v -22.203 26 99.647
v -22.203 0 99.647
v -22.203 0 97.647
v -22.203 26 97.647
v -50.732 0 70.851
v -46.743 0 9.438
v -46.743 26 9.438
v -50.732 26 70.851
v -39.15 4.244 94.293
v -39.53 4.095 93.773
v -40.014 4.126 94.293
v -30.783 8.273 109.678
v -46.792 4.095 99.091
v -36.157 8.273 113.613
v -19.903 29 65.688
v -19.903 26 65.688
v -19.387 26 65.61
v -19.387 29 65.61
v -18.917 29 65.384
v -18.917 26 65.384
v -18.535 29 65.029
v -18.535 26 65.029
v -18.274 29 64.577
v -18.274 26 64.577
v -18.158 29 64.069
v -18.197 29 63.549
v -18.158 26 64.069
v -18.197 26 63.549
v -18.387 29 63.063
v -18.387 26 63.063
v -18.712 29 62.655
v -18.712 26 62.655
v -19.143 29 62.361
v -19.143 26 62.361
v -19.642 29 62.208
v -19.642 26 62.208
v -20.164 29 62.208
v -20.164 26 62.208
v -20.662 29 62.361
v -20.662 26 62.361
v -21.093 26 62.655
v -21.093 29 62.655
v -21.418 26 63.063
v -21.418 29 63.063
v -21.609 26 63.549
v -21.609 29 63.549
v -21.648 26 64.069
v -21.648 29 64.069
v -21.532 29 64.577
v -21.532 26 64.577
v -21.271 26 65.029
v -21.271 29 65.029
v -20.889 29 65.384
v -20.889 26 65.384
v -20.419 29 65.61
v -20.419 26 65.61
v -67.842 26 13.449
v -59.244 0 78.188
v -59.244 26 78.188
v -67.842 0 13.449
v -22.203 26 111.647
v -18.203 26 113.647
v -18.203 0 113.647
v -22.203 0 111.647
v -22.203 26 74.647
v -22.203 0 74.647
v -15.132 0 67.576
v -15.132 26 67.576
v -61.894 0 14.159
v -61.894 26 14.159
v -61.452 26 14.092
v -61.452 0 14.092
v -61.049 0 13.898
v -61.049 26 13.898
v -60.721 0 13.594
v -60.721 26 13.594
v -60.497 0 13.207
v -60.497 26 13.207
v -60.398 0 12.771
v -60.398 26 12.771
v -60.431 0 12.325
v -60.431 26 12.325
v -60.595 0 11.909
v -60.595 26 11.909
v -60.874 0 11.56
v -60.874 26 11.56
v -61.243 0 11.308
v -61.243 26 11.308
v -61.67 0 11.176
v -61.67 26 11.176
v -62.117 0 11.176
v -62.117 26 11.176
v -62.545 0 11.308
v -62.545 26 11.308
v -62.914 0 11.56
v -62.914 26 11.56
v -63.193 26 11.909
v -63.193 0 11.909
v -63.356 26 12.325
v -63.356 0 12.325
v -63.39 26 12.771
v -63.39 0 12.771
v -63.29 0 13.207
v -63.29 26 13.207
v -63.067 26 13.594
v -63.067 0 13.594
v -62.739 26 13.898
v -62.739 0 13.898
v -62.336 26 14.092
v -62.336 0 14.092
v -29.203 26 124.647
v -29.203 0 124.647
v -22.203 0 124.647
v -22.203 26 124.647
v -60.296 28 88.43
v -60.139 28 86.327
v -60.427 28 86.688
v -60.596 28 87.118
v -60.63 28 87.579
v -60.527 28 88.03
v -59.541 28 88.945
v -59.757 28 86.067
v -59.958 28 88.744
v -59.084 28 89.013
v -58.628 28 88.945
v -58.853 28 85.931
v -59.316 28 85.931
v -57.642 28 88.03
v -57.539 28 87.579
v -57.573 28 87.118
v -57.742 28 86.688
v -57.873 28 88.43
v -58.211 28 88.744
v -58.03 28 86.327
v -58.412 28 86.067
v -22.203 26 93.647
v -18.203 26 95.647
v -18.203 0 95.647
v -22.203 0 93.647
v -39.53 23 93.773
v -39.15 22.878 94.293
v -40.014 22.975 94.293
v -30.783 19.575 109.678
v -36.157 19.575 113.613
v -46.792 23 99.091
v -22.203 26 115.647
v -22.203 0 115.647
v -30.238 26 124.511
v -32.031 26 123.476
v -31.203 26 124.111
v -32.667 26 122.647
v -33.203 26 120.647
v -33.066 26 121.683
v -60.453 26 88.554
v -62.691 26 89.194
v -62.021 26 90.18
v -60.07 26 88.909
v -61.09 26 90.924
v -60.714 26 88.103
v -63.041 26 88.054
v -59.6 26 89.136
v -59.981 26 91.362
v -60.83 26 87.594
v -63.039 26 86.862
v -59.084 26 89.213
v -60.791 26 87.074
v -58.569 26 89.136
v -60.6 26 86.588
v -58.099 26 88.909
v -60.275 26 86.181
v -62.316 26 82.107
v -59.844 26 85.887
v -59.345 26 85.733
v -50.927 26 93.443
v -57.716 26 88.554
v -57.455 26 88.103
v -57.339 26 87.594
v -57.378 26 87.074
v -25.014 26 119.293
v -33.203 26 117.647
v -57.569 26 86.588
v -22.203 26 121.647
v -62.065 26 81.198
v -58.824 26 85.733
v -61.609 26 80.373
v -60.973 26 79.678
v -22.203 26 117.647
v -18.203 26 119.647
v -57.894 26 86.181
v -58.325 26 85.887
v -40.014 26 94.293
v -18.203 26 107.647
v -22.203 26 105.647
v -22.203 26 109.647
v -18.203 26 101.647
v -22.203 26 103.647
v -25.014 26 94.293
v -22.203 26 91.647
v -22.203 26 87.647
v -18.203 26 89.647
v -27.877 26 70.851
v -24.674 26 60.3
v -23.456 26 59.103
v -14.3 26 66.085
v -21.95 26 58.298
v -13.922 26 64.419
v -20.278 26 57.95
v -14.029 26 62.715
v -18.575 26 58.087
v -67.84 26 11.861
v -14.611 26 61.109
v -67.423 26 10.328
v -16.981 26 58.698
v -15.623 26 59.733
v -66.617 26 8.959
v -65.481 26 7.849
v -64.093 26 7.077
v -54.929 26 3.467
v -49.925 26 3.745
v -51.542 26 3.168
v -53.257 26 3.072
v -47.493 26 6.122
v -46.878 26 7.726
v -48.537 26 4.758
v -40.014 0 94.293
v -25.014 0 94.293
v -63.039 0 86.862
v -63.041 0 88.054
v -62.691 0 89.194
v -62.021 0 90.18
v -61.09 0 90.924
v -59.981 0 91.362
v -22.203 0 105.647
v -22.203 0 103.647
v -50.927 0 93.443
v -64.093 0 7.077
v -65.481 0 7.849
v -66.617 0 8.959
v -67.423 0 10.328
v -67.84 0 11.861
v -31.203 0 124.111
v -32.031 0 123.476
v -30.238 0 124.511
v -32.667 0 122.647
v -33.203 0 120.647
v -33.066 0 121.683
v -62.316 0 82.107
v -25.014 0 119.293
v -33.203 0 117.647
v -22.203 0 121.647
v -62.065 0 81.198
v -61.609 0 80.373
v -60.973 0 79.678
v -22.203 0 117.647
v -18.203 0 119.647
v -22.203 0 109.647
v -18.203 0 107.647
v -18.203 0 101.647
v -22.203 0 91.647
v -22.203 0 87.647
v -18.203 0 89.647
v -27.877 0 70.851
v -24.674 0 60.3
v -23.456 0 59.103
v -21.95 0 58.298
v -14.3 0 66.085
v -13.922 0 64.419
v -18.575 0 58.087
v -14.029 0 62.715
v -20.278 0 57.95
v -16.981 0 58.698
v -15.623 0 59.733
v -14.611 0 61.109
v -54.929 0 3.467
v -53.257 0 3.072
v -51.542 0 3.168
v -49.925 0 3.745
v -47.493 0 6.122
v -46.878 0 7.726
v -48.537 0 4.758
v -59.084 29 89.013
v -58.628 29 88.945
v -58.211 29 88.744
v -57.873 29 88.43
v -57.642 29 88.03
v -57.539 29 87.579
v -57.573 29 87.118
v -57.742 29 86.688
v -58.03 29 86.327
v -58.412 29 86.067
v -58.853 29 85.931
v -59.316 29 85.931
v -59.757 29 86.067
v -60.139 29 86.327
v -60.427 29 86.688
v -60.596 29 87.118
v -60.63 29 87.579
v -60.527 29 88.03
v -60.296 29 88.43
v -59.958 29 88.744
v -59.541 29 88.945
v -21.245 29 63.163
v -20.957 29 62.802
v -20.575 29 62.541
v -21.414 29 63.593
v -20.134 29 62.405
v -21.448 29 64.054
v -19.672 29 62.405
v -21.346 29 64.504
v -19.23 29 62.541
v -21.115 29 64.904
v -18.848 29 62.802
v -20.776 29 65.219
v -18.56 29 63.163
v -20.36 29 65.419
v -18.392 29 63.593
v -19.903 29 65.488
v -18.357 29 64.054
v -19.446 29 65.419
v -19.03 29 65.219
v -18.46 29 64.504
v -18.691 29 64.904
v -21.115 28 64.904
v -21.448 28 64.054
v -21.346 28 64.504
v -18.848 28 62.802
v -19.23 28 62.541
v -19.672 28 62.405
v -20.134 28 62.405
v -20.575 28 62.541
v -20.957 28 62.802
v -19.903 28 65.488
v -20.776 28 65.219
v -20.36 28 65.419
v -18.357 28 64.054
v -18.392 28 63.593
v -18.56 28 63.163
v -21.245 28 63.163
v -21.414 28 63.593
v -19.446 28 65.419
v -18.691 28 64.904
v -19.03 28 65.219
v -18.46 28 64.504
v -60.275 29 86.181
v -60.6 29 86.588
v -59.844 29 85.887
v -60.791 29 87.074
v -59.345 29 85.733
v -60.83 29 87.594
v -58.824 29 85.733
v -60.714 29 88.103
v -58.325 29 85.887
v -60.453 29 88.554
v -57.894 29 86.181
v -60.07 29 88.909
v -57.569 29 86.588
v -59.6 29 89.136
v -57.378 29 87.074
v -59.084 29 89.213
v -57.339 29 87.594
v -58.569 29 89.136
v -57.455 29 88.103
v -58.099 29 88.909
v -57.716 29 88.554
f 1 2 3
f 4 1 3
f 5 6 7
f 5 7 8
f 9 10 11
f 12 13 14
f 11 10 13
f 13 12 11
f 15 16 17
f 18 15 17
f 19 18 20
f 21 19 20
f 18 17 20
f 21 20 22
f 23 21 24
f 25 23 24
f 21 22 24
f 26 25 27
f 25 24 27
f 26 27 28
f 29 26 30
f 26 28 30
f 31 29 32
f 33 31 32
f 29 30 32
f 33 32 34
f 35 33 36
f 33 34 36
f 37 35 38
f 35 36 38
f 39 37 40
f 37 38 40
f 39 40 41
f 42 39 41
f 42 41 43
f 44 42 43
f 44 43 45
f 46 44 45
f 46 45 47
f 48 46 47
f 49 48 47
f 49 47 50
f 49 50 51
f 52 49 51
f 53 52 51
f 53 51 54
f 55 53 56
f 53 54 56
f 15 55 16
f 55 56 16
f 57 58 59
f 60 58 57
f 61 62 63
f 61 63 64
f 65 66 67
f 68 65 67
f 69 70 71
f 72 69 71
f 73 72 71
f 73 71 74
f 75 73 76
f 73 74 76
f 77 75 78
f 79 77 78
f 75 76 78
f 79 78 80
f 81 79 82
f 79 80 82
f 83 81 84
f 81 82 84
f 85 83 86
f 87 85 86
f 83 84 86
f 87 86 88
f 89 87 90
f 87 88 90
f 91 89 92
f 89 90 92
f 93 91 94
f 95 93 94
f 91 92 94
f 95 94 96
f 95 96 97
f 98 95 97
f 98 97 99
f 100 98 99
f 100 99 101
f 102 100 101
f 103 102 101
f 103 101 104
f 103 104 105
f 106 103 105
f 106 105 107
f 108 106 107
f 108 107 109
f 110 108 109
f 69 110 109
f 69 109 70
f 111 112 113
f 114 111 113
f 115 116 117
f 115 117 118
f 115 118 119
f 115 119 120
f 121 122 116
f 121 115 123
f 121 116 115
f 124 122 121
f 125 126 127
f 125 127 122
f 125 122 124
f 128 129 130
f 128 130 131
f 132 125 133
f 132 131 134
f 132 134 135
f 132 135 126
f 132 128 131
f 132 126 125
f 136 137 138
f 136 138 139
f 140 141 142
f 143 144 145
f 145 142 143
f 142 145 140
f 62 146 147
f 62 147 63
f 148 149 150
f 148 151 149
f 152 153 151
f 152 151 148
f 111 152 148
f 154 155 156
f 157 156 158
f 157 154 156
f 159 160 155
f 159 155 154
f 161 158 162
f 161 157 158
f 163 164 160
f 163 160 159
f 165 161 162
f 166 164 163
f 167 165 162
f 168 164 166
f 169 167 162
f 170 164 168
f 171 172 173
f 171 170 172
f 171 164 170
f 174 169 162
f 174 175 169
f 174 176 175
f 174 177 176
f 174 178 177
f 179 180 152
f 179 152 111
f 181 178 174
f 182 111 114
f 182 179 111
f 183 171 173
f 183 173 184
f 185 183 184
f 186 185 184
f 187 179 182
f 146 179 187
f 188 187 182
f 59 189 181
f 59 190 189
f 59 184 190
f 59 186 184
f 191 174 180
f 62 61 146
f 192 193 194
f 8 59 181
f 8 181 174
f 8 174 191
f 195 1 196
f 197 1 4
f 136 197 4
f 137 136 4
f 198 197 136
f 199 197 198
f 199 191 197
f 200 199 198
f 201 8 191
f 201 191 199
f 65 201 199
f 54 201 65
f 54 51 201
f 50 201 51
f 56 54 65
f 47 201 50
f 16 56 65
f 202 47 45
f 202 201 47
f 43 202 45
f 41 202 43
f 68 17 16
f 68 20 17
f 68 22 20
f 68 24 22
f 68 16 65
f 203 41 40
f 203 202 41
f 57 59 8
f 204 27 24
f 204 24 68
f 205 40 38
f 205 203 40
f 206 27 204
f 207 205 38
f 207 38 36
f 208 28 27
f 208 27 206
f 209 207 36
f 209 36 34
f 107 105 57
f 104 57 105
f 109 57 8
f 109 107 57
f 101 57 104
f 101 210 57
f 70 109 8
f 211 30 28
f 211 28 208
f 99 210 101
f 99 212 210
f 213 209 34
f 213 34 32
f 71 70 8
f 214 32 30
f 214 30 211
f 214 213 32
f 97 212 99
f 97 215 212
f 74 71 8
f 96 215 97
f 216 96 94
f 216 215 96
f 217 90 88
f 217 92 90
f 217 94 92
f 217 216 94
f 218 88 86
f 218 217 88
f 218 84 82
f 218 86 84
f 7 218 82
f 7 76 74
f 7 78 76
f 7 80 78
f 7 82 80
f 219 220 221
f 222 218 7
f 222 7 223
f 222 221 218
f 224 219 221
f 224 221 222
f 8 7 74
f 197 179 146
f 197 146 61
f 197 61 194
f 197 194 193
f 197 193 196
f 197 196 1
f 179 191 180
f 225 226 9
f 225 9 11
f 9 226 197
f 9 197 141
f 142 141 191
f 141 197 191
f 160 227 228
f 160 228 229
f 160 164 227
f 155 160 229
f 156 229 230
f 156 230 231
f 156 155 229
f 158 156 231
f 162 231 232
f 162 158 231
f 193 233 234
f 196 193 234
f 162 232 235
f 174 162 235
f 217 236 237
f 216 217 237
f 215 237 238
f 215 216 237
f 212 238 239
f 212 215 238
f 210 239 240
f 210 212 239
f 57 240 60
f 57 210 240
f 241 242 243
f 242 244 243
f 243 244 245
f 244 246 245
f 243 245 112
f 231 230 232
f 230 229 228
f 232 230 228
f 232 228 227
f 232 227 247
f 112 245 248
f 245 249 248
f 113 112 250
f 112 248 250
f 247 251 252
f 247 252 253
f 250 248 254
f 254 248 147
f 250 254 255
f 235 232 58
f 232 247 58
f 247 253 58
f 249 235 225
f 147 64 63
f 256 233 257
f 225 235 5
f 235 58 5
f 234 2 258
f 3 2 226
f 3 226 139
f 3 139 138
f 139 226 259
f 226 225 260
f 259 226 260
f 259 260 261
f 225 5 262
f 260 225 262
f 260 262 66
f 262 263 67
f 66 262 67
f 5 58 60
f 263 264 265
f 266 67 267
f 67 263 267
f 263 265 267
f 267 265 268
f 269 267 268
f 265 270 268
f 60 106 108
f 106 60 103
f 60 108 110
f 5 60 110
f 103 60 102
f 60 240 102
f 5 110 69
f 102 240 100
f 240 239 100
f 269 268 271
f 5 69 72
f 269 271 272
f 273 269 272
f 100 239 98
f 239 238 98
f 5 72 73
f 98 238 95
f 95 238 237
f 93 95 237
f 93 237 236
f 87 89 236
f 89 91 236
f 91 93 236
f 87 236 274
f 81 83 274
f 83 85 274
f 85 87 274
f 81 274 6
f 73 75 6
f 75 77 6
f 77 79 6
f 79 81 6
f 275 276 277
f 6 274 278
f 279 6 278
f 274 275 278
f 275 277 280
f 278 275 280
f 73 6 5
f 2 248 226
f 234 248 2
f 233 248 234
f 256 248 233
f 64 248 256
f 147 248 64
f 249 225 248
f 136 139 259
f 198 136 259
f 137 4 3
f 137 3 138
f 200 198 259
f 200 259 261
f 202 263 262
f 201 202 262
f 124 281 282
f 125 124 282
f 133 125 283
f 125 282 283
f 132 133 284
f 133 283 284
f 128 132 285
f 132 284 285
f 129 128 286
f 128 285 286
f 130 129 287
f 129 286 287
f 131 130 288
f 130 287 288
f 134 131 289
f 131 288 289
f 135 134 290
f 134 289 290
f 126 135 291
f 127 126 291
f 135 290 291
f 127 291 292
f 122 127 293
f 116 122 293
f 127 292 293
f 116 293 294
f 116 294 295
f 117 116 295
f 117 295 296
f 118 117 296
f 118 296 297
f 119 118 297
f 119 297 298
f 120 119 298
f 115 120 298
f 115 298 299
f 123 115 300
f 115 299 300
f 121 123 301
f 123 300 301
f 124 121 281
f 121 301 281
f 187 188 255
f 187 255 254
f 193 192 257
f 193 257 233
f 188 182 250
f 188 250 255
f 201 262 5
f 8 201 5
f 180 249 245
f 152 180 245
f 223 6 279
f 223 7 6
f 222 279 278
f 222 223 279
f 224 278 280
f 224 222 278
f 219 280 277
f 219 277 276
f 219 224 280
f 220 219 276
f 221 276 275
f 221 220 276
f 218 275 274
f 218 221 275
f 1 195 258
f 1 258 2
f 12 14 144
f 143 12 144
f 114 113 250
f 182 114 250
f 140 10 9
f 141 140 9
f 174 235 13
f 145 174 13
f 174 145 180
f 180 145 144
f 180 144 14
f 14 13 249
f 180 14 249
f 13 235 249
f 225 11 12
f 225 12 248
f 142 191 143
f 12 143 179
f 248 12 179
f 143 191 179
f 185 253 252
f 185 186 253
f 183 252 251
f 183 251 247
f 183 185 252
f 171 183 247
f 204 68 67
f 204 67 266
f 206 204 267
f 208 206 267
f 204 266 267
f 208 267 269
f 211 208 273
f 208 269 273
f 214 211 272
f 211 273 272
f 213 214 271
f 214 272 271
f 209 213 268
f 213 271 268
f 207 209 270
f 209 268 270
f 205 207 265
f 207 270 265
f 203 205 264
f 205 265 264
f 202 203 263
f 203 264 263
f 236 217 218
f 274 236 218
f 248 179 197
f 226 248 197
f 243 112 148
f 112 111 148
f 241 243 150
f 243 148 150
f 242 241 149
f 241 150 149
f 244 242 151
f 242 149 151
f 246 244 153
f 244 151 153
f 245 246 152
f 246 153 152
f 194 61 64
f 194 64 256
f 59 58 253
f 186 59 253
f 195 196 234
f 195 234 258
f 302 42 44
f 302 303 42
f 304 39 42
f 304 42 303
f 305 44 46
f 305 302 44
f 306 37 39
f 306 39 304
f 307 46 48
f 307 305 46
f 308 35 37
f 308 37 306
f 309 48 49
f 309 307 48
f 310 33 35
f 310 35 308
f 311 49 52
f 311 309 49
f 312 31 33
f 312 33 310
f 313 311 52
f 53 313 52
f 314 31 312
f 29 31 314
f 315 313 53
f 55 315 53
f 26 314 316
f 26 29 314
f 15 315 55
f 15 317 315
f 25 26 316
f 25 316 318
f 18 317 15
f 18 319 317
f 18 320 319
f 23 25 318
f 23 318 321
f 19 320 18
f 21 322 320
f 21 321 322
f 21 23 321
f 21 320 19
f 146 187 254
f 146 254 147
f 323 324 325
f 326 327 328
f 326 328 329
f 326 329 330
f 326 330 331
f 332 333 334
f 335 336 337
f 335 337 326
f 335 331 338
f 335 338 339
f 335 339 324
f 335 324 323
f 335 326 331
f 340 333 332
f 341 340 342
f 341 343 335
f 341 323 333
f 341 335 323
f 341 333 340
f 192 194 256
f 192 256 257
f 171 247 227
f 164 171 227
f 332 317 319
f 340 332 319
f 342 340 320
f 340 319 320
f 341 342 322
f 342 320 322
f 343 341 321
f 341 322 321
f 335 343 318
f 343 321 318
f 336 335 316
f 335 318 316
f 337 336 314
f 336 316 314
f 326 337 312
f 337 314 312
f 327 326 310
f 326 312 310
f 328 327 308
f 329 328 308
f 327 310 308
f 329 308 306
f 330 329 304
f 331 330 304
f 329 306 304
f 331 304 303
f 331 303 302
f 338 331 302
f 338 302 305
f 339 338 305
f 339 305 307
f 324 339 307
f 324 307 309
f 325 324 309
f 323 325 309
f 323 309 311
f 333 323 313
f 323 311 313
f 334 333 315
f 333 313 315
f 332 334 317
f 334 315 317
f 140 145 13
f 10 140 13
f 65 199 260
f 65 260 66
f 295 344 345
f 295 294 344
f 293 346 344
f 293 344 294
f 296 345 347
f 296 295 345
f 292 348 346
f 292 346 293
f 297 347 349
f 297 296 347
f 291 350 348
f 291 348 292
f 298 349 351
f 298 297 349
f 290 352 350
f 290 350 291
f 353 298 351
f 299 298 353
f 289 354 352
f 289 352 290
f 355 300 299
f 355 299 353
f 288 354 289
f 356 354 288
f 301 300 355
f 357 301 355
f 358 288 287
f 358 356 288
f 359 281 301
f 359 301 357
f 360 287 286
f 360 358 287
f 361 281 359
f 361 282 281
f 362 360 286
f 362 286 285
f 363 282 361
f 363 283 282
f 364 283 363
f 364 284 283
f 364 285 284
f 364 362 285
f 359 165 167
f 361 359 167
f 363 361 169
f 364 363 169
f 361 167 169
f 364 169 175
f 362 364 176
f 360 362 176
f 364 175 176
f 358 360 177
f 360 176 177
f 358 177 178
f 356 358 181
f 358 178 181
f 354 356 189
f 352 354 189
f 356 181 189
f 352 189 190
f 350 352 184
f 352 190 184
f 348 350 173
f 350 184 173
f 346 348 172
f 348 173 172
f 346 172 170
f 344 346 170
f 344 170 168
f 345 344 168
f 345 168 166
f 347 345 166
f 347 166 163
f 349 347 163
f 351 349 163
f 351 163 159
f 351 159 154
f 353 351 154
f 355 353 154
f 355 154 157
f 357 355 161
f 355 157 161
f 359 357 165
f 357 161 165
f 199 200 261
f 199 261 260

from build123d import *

# Parameters (mm, degrees)
BOSS_EXTRUDE1_DEPTH = 26
FILLET1_R           = 6
FILLET2_R           = 4
BOSS_EXTRUDE2_DEPTH = 26
LPATTERN1_COUNT     = 6
LPATTERN1_PITCH     = 6
CUT_EXTRUDE1_DEPTH  = 145.300050087
CUT_EXTRUDE2_DEPTH  = 9
SKETCH5_R           = 1.5
CUT_EXTRUDE3_DEPTH  = 145.300050087
SKETCH6_R           = 1.75
BOSS_EXTRUDE4_DEPTH = 3
SKETCH7_R           = 1.55
CUT_EXTRUDE4_DEPTH  = 1
SKETCH8_R           = 1.55
CUT_EXTRUDE9_DEPTH  = 1


with BuildPart() as part:
    # Sketch1 → Boss-Extrude1 (new body)
    with BuildSketch(Plane(origin=(0, 0, 0), x_dir=(1, 0, 0), z_dir=(0, 1, 0))):
        with BuildLine():
            Line((-50.731616693, -70.850705373), (-59.243664017, -78.187515911))
            Line((-59.243664017, -78.187515911), (-62.093532673, -80.643910429))
            Line((-62.093532673, -80.643910429), (-63.59680926, -90.530272728))
            Line((-63.59680926, -90.530272728), (-50.927362258, -93.443194403))
            Line((-50.927362258, -93.443194403), (-33.202701652, -117.647252046))
            Line((-33.202701652, -117.647252046), (-33.202701652, -124.647252046))
            Line((-33.202701652, -124.647252046), (-22.202701652, -124.647252046))
            Line((-22.202701652, -124.647252046), (-22.202701652, -74.647252046))
            Line((-22.202701652, -74.647252046), (-15.131633841, -67.576184234))
            ThreePointArc((-15.131633841, -67.576184234), (-16.26454773, -59.166873554), (-24.673858411, -60.299787444))
            Line((-24.673858411, -60.299787444), (-27.876609184, -70.850705373))
            Line((-27.876609184, -70.850705373), (-50.731616693, -70.850705373))
        make_face()
        Polygon((-50.731616693, -70.850705373), (-59.243664017, -78.187515911), (-68.459423033, -8.796812025), (-46.129709685, 0), align=None)
    extrude(amount=BOSS_EXTRUDE1_DEPTH)

    # Fillet1
    fillet1_edges = [part.edges().sort_by_distance(p)[0] for p in [
        (-68.459423033, 13, 8.796812025),
        (-46.129709685, 13, 0),
    ]]
    fillet(fillet1_edges, radius=FILLET1_R)

    # Fillet2
    fillet2_edges = [part.edges().sort_by_distance(p)[0] for p in [
        (-33.202701652, 13, 124.647252046),
        (-63.59680926, 13, 90.530272728),
        (-62.093532673, 13, 80.643910429),
    ]]
    fillet(fillet2_edges, radius=FILLET2_R)

    # Sketch2 → Boss-Extrude2 (add)
    with BuildSketch(Plane(origin=(0, 26, 0), x_dir=(1, 0, 0), z_dir=(0, 1, 0))):
        Polygon((-22.202701652, -119.647252046), (-22.202701652, -121.647252046), (-18.202701652, -119.647252046), align=None)
        Polygon((-22.202701652, -117.647252046), (-22.202701652, -119.647252046), (-18.202701652, -119.647252046), align=None)
    boss_extrude2 = extrude(amount=-BOSS_EXTRUDE2_DEPTH)

    # LPattern1: Boss-Extrude2 ×6
    with Locations(*[(0, 0, -i * LPATTERN1_PITCH) for i in range(1, LPATTERN1_COUNT)]):
        add(boss_extrude2)

    # Sketch3 → Cut-Extrude1 (cut, through all)
    with BuildSketch(Plane(origin=(0, 26, 0), x_dir=(1, 0, 0), z_dir=(0, 1, 0))):
        Polygon((-25.014177768, -119.292756392), (-25.014177768, -94.292756392), (-40.014177768, -94.292756392), align=None)
    extrude(amount=-CUT_EXTRUDE1_DEPTH, mode=Mode.SUBTRACT)

    # Sketch4 → Cut-Extrude2 (cut)
    with BuildSketch(Plane(origin=(-77.692274337, 0, 56.894146205), x_dir=(0.5908220201984185, 0, 0.8068019214458154), z_dir=(-0.8068019214458154, 0, 0.5908220201984185))):
        Polygon((52.301141737, 23), (52.301141737, 4.095051152), (70.301141737, 8.273318832), (70.301141737, 19.575190426), align=None)
    extrude(amount=-CUT_EXTRUDE2_DEPTH, mode=Mode.SUBTRACT)

    # Sketch5 → Cut-Extrude3 (cut, through all)
    with BuildSketch(Plane(origin=(0, 26, 0), x_dir=(1, 0, 0), z_dir=(0, 1, 0))):
        with Locations(Location((-61.893792149, -12.659081905, 0), (0, 0, 270))):
            Circle(SKETCH5_R)
    extrude(amount=-CUT_EXTRUDE3_DEPTH, mode=Mode.SUBTRACT)

    # Sketch6 → Boss-Extrude4 (add)
    with BuildSketch(Plane(origin=(0, 26, 0), x_dir=(1, 0, 0), z_dir=(0, 1, 0))):
        with Locations(Location((-59.084491881, -87.463369105, 0), (0, 0, 270))):
            Circle(SKETCH6_R)
        with Locations(Location((-19.902746126, -63.937985839, 0), (0, 0, 270))):
            Circle(SKETCH6_R)
    extrude(amount=BOSS_EXTRUDE4_DEPTH)

    # Sketch7 → Cut-Extrude4 (cut)
    with BuildSketch(Plane(origin=(0, 29, 0), x_dir=(1, 0, 0), z_dir=(0, 1, 0))):
        with Locations(Location((-59.084491881, -87.463369105, 0), (0, 0, 270))):
            Circle(SKETCH7_R)
    extrude(amount=-CUT_EXTRUDE4_DEPTH, mode=Mode.SUBTRACT)

    # Sketch8 → Cut-Extrude9 (cut)
    with BuildSketch(Plane(origin=(0, 29, 0), x_dir=(1, 0, 0), z_dir=(0, 1, 0))):
        with Locations(Location((-19.902746126, -63.937985839, 0), (0, 0, 270))):
            Circle(SKETCH8_R)
    extrude(amount=-CUT_EXTRUDE9_DEPTH, mode=Mode.SUBTRACT)


solid = part.part
